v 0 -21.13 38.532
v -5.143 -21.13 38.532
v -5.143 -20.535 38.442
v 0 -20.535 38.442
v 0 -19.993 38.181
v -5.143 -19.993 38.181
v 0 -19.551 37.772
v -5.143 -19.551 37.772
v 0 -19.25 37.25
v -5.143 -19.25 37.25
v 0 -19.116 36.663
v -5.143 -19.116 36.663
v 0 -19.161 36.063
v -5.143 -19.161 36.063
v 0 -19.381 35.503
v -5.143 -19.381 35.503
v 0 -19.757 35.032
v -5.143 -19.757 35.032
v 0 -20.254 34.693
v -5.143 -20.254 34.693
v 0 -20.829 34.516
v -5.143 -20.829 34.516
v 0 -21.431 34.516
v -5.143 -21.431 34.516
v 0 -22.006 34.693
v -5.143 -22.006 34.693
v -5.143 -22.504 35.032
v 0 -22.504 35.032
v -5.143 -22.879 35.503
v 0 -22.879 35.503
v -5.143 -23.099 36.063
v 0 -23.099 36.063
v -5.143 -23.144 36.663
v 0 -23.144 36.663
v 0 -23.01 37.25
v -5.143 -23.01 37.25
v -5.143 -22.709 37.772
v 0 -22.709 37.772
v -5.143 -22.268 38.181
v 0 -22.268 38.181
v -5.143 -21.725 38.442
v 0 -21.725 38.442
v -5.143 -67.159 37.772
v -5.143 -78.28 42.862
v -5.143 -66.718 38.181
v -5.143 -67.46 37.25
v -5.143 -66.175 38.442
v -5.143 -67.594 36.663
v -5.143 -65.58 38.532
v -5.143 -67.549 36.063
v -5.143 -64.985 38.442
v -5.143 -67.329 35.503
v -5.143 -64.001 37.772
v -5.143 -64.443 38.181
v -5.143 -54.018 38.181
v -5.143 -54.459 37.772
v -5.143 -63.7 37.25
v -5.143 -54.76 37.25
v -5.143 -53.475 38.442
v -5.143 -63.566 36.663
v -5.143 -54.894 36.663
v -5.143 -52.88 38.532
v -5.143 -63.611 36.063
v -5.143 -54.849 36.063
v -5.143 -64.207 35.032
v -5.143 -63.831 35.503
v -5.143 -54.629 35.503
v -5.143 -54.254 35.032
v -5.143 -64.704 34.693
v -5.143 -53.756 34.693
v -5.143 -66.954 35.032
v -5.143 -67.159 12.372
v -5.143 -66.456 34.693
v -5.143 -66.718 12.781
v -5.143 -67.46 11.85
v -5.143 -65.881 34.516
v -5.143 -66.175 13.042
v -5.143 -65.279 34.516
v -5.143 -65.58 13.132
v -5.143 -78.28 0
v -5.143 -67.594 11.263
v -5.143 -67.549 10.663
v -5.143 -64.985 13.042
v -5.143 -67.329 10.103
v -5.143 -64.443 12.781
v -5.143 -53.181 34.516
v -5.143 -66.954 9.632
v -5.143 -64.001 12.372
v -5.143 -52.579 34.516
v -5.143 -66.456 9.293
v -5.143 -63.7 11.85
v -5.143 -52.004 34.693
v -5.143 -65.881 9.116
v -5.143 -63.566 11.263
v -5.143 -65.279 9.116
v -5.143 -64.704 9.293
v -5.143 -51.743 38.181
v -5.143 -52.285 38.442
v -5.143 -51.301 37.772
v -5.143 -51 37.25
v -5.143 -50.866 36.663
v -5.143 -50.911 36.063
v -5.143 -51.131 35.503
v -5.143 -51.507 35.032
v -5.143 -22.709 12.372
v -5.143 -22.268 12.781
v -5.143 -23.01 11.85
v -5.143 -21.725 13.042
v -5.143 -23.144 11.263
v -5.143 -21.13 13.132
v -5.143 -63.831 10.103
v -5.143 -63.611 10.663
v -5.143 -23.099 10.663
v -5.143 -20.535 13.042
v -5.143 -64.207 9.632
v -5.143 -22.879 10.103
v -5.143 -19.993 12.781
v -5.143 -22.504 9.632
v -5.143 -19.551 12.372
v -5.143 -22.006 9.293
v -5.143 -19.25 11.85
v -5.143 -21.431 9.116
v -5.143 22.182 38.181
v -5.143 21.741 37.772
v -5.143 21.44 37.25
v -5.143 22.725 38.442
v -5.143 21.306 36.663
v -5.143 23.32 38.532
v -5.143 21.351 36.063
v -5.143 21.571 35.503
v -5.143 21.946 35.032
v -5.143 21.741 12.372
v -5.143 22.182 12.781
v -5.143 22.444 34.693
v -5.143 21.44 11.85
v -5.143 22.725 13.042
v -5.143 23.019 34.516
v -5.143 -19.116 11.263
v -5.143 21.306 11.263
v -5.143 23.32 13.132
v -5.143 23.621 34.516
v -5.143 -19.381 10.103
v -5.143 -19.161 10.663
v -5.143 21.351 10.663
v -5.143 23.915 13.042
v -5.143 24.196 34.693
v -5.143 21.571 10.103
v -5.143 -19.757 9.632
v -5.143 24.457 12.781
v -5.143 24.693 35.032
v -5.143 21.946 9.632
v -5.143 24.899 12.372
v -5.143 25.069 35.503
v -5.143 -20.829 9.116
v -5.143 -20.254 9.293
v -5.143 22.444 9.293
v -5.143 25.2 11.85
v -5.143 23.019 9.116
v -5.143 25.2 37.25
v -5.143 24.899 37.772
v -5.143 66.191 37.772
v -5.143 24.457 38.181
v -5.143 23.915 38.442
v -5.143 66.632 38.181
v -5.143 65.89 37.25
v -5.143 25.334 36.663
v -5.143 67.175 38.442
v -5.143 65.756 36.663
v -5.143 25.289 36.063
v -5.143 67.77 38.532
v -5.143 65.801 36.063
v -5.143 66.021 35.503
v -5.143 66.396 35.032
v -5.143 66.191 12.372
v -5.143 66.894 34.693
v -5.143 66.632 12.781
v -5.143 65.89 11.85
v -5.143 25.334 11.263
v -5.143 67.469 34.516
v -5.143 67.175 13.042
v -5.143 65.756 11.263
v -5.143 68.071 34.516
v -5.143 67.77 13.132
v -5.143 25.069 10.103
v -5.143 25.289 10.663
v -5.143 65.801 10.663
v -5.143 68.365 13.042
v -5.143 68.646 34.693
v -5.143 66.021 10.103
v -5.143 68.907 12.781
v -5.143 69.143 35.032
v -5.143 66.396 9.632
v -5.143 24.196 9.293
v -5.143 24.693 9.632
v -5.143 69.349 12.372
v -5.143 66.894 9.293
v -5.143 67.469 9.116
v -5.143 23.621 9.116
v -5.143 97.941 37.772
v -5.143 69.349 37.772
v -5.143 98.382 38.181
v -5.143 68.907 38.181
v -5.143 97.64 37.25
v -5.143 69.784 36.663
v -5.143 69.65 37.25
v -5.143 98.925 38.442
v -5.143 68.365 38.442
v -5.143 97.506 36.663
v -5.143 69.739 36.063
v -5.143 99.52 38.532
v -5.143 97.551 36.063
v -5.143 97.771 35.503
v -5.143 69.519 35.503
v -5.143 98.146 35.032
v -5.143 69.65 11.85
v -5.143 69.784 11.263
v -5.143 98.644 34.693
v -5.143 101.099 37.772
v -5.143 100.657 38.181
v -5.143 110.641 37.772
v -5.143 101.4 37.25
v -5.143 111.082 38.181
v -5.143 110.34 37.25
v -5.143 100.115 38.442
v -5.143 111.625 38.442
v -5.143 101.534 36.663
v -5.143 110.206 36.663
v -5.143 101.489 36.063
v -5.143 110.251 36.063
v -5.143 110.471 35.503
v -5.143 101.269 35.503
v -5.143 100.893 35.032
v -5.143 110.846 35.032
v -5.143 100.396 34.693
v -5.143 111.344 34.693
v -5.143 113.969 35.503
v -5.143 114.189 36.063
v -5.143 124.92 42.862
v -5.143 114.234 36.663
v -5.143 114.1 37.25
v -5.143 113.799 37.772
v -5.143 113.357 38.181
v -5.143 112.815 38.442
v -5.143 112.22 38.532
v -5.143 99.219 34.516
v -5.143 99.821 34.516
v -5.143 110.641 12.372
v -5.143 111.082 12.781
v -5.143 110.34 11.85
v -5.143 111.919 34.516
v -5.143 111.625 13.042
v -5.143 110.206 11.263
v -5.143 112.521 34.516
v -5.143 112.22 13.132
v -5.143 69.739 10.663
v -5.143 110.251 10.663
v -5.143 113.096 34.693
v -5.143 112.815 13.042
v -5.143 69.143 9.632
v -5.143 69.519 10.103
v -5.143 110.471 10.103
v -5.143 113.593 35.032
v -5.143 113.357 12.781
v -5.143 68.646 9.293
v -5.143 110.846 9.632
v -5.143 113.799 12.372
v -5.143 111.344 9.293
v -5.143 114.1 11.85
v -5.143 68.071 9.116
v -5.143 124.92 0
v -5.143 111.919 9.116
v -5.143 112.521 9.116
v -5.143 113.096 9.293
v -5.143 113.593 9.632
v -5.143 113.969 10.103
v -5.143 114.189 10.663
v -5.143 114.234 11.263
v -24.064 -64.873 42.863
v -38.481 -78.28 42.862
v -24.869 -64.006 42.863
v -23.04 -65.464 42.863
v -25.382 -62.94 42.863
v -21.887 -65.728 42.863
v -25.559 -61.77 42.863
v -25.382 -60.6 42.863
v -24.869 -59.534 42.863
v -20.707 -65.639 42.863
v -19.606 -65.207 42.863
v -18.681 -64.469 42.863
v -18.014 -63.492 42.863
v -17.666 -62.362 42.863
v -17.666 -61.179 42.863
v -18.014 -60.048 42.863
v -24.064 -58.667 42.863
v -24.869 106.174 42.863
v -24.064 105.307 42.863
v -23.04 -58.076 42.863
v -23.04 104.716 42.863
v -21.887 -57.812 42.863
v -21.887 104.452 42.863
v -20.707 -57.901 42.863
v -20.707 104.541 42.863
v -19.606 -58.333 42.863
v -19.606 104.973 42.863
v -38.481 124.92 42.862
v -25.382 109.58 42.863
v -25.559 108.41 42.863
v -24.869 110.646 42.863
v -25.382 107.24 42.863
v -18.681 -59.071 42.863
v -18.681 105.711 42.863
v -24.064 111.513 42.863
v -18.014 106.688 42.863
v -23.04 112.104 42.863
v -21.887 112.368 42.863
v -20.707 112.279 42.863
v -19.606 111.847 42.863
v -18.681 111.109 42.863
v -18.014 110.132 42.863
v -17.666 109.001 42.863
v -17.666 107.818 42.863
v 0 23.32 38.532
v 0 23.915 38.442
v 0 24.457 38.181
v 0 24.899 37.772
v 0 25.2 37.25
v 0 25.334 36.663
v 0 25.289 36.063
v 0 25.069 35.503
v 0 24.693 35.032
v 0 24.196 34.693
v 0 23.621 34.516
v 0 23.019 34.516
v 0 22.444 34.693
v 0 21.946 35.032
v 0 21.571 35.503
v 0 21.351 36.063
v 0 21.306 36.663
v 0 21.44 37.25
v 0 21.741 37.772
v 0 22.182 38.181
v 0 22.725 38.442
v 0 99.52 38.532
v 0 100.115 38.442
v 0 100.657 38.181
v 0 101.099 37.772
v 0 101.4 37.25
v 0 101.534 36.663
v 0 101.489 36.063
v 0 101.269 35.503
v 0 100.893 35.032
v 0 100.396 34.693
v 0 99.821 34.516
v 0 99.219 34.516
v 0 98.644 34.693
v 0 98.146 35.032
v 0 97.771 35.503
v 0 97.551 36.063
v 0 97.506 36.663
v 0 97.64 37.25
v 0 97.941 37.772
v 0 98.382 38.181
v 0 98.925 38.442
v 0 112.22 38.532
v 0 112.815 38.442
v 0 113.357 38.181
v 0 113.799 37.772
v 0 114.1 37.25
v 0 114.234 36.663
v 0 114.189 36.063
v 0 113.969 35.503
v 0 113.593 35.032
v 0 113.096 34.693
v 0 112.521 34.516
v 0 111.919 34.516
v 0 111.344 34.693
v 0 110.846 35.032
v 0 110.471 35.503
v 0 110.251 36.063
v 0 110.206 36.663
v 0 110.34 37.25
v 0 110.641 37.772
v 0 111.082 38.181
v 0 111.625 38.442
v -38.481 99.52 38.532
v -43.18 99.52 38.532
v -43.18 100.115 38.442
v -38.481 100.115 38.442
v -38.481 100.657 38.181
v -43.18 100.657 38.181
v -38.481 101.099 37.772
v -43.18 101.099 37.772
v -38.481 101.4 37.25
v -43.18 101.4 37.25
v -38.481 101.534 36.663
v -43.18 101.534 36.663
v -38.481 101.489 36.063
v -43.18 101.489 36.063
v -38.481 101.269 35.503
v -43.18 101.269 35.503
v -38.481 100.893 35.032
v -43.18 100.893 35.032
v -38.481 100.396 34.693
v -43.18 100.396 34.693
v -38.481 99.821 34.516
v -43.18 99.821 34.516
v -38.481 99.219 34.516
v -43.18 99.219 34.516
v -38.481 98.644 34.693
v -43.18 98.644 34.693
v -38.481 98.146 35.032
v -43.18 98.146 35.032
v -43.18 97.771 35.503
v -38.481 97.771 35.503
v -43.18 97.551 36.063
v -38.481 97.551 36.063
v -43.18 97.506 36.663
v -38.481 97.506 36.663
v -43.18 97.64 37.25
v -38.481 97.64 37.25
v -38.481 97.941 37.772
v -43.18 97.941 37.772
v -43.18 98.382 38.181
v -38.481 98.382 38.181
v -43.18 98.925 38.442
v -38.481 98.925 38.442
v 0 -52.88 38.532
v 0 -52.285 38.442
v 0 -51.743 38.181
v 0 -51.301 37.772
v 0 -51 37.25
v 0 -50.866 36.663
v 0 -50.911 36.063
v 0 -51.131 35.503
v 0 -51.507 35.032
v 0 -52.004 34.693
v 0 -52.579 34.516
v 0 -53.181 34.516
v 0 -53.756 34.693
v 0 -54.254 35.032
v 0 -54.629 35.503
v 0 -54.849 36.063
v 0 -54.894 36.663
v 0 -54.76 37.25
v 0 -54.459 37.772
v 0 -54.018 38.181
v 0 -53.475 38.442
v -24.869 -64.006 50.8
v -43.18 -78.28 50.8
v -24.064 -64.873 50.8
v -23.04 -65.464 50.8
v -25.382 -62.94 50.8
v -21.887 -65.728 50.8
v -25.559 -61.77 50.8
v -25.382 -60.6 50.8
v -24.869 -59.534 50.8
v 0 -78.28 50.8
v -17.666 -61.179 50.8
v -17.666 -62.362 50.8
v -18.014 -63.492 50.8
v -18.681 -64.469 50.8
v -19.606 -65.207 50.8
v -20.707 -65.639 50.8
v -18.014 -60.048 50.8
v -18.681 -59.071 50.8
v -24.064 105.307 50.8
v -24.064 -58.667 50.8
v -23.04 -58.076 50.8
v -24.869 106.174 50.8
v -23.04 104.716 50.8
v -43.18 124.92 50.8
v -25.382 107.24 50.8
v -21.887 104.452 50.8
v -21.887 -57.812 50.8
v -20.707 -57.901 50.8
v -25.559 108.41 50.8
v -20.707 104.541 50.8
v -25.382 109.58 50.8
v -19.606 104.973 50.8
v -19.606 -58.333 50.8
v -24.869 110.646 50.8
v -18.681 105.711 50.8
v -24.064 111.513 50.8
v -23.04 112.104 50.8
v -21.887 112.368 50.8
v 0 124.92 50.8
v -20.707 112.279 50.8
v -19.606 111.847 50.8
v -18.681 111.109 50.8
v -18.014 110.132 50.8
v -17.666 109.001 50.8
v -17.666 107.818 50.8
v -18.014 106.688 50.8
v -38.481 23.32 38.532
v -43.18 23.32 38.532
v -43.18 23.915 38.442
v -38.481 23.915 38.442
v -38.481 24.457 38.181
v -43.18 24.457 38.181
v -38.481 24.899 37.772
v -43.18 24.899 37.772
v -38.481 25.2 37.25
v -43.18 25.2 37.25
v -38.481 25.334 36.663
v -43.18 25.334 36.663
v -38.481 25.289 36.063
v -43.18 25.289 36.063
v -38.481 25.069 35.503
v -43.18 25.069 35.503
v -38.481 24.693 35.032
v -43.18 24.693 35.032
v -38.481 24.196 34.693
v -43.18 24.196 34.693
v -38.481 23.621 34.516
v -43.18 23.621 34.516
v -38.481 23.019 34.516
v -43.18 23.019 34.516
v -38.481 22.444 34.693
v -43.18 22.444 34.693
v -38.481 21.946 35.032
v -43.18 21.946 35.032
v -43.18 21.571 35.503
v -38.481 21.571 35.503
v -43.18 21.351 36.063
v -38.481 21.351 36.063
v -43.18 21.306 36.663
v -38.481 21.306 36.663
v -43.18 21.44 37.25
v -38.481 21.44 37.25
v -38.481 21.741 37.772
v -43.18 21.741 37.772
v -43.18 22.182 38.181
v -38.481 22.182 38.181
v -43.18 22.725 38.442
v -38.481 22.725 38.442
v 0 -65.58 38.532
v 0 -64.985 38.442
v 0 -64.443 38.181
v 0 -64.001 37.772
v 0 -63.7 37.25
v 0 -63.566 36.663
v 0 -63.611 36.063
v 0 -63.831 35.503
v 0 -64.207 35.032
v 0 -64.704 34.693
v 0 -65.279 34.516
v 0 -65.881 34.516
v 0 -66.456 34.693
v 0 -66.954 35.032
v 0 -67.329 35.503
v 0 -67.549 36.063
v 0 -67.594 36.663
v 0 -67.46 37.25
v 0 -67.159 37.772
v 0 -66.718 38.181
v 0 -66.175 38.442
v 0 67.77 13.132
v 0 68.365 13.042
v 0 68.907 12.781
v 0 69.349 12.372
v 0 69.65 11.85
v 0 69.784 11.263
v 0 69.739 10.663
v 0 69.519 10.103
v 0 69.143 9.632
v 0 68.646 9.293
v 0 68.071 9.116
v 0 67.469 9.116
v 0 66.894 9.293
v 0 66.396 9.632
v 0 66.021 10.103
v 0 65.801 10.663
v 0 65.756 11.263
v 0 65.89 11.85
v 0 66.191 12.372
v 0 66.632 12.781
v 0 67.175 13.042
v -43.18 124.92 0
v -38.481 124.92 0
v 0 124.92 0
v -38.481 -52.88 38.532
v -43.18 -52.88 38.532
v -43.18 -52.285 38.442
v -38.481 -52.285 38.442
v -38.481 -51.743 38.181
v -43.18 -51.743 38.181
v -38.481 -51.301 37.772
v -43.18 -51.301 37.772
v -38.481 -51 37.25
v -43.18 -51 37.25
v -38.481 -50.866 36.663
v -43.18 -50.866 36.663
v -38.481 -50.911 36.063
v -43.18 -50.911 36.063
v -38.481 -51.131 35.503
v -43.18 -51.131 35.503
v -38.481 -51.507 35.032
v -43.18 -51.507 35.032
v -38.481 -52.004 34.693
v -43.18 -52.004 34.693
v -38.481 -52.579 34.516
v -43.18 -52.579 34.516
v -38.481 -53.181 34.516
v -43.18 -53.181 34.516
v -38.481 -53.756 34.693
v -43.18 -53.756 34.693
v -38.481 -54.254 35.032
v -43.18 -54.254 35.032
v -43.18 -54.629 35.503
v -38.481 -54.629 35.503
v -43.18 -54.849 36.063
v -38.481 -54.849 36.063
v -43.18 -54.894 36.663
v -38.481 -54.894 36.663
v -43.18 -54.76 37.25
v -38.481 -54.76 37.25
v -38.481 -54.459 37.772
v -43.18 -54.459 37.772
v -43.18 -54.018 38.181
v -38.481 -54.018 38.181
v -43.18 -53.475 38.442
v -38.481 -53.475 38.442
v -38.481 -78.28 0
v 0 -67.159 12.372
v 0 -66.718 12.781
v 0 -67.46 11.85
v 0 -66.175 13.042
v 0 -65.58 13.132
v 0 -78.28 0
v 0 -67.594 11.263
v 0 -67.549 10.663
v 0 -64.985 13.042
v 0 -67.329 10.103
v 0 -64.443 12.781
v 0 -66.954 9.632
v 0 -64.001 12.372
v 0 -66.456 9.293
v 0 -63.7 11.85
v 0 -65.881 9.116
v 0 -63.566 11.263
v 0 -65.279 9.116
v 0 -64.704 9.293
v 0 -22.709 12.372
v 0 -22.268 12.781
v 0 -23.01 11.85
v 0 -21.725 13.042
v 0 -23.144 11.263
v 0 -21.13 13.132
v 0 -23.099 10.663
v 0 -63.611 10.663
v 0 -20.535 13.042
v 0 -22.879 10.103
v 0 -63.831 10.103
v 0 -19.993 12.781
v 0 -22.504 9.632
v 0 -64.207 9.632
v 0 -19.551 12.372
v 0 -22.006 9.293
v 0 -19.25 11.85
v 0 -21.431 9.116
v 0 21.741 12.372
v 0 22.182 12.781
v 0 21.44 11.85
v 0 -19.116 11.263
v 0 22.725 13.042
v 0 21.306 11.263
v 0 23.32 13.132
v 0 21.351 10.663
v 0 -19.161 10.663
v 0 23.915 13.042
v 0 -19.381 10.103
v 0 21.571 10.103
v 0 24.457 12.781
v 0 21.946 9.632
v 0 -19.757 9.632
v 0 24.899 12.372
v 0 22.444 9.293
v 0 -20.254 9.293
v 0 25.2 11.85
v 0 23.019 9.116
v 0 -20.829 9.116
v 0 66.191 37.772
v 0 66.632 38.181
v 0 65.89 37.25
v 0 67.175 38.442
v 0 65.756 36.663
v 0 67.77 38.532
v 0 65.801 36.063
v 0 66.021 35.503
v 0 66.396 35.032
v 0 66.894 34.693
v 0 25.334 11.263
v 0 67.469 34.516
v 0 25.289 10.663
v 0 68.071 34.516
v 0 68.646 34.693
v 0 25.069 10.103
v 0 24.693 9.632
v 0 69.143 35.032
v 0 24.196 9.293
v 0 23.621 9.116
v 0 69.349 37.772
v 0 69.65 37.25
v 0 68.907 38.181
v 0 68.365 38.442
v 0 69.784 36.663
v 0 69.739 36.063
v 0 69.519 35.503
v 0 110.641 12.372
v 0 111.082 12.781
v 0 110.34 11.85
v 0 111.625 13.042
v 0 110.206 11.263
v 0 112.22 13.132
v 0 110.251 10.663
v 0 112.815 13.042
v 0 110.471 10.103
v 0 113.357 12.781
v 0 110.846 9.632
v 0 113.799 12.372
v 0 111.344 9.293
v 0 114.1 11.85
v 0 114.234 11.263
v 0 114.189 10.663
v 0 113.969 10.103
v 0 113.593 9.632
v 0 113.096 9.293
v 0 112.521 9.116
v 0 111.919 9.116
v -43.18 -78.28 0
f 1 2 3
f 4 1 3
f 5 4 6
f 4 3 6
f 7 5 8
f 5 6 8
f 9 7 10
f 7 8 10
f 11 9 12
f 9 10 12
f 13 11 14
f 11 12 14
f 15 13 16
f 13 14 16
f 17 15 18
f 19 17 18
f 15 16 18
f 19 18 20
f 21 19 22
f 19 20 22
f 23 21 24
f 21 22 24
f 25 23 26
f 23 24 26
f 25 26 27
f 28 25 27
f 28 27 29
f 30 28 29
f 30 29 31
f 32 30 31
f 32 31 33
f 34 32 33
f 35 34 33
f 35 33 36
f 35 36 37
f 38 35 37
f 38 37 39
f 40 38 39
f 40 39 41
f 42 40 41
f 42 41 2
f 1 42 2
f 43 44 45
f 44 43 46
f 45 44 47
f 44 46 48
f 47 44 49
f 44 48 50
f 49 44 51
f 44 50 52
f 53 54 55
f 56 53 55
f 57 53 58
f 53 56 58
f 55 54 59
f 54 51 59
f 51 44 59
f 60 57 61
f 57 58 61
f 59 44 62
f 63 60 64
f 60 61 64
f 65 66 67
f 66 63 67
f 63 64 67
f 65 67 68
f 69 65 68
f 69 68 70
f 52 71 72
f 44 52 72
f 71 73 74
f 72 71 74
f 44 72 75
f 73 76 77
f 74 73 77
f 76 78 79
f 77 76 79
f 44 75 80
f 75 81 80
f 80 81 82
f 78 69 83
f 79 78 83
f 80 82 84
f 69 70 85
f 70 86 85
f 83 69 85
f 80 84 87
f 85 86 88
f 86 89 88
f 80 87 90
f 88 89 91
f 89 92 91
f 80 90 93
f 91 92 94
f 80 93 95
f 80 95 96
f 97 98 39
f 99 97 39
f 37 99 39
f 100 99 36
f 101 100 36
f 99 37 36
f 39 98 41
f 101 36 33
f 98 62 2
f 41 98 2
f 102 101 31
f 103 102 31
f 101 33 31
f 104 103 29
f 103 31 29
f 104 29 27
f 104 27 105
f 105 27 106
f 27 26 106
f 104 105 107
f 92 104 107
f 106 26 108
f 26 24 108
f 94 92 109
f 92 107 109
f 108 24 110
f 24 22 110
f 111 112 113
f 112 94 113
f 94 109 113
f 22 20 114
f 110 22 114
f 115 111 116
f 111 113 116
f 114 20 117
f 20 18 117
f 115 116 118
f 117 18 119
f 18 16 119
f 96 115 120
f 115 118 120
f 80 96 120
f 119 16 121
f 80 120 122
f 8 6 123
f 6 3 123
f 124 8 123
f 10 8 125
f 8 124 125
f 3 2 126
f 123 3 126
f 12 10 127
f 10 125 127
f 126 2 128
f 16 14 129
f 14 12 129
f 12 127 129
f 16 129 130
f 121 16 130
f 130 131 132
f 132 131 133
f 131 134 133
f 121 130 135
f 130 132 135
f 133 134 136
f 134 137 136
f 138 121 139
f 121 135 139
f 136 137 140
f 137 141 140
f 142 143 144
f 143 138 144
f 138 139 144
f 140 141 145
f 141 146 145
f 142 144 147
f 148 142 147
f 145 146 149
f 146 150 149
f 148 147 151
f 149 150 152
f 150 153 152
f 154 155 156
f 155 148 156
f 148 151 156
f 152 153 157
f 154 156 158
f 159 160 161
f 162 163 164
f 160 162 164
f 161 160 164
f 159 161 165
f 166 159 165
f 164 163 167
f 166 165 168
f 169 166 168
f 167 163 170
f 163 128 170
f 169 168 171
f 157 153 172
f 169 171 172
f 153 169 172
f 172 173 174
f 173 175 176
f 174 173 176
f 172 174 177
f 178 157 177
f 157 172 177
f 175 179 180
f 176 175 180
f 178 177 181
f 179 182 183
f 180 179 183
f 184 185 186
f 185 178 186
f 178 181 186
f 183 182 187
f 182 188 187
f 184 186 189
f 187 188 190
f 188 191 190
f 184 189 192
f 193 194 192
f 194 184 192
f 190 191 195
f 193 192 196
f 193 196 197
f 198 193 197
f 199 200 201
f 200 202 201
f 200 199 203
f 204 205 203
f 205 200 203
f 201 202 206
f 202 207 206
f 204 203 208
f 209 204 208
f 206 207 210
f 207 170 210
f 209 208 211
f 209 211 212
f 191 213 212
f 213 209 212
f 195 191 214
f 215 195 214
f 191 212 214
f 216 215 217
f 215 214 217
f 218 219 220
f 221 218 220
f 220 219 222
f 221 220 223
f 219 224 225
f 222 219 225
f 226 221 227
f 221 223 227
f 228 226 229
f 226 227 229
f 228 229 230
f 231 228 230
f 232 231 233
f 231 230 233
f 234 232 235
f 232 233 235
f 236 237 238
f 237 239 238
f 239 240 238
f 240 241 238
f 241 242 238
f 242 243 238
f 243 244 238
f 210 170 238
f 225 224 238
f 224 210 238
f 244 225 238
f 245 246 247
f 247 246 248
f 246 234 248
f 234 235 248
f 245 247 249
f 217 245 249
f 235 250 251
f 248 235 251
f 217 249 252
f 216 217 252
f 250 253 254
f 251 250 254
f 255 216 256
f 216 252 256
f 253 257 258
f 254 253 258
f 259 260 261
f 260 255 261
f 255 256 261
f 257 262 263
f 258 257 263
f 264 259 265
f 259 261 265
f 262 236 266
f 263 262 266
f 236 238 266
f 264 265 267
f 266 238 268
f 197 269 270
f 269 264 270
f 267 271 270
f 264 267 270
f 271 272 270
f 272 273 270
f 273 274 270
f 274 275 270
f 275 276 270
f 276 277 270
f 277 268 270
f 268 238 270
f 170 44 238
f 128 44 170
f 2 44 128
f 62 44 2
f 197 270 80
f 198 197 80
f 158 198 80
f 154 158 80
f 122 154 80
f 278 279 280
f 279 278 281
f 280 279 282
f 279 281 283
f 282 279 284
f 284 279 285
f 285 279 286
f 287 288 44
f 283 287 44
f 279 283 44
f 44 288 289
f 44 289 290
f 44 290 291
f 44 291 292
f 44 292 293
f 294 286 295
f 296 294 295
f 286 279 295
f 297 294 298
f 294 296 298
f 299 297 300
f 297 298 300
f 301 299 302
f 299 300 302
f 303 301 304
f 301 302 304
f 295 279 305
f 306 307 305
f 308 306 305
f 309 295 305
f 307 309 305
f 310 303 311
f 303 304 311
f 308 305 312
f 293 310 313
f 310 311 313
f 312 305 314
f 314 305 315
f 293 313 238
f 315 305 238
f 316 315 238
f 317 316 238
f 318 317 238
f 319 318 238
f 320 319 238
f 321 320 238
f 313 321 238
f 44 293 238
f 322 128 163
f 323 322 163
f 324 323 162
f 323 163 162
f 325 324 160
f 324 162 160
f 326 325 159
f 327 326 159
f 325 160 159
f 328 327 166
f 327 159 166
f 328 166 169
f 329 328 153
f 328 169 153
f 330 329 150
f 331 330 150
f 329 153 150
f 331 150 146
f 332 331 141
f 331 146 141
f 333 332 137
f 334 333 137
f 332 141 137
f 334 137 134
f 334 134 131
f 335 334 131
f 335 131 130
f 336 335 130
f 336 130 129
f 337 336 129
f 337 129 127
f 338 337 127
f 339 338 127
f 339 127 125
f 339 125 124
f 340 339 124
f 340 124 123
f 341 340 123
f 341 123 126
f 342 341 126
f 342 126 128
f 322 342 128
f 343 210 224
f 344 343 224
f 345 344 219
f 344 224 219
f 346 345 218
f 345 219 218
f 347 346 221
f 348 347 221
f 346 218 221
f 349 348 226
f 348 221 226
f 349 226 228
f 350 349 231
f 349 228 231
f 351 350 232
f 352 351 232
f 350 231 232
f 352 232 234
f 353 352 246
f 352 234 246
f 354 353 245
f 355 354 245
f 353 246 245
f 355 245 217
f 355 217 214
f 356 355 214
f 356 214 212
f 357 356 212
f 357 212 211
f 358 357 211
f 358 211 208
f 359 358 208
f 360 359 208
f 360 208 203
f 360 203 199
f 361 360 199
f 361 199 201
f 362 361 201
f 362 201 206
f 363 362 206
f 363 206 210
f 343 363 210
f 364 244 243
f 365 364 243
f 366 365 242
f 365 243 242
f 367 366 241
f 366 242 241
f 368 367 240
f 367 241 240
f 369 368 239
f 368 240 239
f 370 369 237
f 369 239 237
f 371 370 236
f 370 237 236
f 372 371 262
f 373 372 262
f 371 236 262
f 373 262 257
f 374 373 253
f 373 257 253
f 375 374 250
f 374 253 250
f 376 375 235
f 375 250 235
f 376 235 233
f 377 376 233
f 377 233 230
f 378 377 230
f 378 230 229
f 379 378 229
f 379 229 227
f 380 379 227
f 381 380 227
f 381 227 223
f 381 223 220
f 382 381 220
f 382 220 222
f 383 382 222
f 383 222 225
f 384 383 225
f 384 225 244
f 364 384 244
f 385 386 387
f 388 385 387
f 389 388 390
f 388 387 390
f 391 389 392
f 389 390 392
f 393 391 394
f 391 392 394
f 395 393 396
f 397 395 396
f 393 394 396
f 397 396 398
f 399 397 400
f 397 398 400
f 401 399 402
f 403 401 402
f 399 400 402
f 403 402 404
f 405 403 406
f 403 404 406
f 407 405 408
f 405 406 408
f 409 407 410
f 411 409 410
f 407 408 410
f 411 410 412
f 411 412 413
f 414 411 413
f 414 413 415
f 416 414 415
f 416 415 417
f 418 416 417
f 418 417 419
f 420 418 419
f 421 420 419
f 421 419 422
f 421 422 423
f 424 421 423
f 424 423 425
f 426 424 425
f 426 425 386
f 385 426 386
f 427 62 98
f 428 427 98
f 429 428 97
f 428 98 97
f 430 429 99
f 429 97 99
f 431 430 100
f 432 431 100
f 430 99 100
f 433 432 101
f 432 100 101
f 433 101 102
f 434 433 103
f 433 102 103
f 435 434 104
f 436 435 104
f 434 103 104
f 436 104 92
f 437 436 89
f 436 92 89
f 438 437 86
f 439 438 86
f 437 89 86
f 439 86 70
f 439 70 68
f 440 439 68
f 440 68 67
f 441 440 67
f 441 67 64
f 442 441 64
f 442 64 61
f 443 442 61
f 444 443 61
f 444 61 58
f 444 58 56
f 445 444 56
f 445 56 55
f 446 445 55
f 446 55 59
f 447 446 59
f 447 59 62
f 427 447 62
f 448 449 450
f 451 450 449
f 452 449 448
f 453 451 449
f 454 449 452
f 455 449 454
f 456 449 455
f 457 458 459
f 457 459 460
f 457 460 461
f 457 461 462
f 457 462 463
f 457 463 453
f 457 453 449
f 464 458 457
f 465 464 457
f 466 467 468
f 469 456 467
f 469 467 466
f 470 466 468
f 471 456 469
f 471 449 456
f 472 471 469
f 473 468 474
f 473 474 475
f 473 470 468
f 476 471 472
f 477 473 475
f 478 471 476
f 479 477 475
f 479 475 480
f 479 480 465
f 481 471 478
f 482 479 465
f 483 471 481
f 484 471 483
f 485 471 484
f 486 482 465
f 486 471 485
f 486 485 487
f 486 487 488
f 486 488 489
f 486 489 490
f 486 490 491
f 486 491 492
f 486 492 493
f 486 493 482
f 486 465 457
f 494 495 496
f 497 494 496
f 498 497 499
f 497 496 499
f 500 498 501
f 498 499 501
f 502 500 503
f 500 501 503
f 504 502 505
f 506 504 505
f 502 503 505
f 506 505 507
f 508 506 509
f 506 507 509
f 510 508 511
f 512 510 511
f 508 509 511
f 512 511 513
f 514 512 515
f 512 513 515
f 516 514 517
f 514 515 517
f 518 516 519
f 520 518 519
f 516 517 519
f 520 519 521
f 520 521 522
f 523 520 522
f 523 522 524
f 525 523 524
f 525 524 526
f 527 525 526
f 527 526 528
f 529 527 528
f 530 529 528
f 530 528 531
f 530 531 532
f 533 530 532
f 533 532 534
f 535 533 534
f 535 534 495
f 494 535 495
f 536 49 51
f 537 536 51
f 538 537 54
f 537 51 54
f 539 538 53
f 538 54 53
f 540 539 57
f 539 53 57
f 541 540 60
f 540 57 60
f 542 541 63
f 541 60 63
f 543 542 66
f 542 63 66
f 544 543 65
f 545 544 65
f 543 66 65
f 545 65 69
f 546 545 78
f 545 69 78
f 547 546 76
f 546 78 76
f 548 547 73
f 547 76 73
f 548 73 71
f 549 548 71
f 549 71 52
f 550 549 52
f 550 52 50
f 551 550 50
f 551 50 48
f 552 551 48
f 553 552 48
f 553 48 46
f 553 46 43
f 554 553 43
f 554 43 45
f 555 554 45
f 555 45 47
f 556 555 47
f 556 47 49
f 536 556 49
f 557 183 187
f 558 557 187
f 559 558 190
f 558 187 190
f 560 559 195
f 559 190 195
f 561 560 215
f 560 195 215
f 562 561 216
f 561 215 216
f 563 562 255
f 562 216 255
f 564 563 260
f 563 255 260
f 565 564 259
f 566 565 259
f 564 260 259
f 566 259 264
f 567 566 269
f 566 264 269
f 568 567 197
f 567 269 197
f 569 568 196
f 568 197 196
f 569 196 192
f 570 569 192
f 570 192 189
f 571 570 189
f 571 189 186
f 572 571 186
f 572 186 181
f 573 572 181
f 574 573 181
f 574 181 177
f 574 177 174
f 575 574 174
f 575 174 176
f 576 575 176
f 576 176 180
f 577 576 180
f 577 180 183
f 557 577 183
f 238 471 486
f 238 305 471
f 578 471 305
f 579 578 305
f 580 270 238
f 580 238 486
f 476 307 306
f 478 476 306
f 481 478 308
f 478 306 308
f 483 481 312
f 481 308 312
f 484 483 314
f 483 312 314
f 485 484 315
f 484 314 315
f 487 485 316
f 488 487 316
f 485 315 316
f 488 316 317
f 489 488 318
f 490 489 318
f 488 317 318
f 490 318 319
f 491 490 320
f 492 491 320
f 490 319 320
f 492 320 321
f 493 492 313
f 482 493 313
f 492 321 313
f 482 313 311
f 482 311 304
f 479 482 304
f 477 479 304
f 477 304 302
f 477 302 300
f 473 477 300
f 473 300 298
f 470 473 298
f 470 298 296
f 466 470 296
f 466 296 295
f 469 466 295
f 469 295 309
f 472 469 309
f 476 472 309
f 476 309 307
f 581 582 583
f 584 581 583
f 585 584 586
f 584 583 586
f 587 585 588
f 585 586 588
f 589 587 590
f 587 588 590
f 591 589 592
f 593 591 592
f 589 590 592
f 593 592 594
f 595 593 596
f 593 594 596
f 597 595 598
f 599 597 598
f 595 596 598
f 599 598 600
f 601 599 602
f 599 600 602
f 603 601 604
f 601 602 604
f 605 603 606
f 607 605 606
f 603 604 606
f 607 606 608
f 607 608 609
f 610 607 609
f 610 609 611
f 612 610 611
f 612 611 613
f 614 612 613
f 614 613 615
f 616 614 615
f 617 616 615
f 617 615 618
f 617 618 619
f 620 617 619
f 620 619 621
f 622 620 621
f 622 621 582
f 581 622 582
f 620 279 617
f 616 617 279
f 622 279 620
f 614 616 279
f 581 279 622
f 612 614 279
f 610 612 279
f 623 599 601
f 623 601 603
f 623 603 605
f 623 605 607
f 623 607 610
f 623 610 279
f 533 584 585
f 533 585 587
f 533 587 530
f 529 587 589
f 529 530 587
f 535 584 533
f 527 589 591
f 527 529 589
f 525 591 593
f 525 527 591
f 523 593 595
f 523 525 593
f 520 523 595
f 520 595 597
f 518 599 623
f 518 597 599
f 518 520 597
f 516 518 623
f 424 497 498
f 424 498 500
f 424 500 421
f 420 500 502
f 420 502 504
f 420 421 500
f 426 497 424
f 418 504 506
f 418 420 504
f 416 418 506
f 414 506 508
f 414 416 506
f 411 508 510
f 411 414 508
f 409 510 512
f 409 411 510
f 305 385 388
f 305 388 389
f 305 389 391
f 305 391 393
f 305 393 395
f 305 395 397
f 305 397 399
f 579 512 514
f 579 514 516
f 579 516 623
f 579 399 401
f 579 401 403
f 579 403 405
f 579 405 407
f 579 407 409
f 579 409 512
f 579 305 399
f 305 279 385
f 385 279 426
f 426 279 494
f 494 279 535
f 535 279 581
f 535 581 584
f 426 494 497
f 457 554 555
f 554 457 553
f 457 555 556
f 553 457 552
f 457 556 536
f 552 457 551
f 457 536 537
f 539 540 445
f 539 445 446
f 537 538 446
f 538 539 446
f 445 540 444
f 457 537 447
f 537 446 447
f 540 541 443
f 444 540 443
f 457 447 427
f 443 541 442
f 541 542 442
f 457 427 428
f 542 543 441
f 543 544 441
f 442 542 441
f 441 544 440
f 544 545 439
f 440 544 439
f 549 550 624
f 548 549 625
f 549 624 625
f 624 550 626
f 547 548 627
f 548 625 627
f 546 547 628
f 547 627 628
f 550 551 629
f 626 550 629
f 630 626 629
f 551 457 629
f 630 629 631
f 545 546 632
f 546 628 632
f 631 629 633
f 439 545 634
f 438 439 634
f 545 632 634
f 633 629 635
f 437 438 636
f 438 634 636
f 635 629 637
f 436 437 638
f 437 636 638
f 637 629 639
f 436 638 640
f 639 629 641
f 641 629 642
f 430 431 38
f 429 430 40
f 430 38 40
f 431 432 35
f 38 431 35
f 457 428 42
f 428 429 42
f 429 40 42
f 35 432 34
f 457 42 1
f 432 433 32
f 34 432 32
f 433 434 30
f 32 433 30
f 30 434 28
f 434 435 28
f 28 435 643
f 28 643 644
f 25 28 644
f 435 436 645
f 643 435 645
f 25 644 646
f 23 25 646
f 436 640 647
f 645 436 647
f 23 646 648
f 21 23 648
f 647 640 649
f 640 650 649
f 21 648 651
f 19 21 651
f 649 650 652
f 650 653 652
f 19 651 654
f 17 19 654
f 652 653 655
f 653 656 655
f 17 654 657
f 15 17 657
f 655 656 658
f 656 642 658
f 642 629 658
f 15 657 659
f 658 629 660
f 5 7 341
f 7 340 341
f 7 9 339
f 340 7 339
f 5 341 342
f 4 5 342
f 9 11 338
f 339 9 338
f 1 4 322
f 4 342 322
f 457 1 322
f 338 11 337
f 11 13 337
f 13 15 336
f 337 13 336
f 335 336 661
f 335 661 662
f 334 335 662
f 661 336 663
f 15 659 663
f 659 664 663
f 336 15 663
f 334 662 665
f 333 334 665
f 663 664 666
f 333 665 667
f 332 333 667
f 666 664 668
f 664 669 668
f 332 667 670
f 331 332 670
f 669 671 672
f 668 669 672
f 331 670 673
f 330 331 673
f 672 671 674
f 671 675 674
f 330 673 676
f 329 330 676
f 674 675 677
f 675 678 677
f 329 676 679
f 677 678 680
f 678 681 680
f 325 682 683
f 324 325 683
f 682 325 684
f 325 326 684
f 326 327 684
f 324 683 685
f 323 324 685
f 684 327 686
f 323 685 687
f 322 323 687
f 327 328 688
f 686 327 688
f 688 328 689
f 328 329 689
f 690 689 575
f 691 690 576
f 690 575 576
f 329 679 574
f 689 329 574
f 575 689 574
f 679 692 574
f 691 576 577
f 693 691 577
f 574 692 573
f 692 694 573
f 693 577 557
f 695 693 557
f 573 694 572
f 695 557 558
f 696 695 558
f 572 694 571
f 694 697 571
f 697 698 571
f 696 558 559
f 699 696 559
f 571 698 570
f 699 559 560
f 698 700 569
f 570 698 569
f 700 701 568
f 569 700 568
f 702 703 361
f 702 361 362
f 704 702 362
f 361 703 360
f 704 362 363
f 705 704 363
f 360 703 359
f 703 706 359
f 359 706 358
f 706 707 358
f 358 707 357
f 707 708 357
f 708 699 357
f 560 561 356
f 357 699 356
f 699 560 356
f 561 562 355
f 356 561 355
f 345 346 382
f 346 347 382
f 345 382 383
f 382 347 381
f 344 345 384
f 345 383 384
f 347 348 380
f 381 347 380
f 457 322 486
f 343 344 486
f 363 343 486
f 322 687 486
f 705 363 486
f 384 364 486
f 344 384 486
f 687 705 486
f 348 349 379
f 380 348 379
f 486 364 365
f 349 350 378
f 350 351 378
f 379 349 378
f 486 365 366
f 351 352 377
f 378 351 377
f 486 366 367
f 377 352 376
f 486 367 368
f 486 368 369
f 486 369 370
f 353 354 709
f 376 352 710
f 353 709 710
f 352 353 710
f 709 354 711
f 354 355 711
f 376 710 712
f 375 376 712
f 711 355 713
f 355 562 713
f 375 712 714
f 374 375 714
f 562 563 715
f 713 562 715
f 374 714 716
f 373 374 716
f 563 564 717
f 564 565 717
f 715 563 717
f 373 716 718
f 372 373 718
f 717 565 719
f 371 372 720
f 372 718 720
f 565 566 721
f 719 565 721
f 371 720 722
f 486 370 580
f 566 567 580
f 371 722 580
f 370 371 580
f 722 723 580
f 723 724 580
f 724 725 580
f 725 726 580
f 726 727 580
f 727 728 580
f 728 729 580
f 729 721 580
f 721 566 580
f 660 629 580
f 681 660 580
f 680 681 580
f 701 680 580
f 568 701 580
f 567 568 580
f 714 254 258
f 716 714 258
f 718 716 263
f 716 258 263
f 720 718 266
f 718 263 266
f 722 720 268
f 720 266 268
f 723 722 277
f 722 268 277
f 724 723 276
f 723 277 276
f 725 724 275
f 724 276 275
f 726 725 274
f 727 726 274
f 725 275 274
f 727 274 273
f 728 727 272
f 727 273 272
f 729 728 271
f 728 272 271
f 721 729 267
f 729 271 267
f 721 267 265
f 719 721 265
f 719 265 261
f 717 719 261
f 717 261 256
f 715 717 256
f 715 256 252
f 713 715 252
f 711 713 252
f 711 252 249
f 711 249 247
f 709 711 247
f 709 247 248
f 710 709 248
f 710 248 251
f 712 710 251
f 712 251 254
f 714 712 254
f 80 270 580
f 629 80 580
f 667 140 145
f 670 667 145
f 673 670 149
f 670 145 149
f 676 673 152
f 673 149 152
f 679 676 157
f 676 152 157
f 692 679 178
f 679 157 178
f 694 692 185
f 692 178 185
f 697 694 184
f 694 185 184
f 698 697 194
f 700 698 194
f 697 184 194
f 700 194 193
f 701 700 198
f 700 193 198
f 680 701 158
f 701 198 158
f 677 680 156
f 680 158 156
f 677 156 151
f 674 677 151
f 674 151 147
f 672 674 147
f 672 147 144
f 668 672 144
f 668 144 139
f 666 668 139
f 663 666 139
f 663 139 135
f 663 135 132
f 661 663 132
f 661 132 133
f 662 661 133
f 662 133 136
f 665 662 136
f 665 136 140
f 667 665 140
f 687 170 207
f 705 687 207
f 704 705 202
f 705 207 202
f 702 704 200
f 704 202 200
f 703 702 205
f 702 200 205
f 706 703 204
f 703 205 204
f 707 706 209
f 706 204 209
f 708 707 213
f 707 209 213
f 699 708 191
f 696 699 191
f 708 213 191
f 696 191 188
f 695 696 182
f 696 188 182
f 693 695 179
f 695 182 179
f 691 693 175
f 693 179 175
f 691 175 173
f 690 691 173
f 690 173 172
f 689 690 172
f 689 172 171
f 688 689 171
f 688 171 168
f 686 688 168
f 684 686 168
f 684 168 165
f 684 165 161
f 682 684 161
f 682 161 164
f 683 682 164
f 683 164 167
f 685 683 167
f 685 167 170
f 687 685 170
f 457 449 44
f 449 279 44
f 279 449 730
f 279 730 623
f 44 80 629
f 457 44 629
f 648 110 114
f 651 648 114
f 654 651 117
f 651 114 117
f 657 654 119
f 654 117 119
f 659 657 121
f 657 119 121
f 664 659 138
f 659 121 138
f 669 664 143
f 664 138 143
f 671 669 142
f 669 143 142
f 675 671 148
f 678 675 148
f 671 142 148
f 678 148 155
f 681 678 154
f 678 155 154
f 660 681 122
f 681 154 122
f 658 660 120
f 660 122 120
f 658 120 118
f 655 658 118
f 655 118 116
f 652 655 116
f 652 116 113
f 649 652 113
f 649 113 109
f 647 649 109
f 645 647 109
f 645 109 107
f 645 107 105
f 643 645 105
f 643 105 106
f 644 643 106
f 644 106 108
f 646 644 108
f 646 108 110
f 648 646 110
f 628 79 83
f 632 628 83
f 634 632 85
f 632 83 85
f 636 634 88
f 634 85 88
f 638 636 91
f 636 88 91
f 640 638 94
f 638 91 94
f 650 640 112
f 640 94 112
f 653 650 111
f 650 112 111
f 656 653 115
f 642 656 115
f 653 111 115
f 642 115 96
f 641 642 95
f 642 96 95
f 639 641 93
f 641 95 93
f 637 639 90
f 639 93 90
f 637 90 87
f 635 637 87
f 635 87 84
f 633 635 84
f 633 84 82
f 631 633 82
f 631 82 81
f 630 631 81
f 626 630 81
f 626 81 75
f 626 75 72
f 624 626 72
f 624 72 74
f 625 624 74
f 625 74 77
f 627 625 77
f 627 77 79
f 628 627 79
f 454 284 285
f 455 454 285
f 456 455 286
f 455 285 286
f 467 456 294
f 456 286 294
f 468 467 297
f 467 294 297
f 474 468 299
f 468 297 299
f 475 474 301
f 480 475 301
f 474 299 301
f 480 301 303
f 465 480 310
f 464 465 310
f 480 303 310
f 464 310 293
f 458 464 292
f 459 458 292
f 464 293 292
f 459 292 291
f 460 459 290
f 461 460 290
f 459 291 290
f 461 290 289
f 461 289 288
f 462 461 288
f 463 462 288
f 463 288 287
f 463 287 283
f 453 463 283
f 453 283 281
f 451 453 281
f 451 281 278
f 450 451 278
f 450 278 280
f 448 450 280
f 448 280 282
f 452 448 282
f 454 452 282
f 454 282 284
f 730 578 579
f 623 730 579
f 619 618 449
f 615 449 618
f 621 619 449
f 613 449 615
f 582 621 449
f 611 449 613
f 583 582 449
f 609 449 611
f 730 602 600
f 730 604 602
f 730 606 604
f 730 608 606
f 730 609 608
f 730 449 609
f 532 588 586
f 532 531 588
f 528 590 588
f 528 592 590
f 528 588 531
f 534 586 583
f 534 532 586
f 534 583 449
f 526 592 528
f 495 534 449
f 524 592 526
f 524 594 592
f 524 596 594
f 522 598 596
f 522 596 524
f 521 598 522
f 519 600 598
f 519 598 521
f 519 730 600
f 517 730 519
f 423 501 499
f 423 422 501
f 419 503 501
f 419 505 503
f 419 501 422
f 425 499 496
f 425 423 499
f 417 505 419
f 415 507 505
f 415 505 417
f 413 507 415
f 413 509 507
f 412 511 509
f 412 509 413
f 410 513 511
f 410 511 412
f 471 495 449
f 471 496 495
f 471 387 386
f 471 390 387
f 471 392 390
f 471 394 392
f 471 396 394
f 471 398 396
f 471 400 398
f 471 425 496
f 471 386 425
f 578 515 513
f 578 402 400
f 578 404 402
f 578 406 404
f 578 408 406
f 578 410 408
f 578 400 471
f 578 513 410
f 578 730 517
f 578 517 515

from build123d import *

# Parameters (mm, degrees)
SKETCH1_W                  = 43.18
SKETCH1_H                  = 203.2
BOSS_EXTRUDE1_DEPTH        = 50.8
F_3_8_16_TAPPED_HOLE1_D    = 7.9375
F_10_32_TAPPED_HOLE1_D     = 4.0386
SKETCH9_W                  = 33.3375
SKETCH9_H                  = 50.596782444
CUT_EXTRUDE1_DEPTH         = 214.858346575
F_10_32_TAPPED_HOLE2_D     = 4.0386
F_10_32_TAPPED_HOLE2_DEPTH = 17.78
F_10_32_TAPPED_HOLE2_TIP   = 1.213317848
F_10_32_TAPPED_HOLE3_D     = 4.0386
F_10_32_TAPPED_HOLE3_DEPTH = 17.78
F_10_32_TAPPED_HOLE3_TIP   = 1.213317848


with BuildPart() as part:
    # Sketch1 → Boss-Extrude1 (new body)
    with BuildSketch(Plane.XY):
        with Locations((-21.59, 23.319966314)):
            Rectangle(SKETCH1_W, SKETCH1_H)
    extrude(amount=BOSS_EXTRUDE1_DEPTH)

    # 3/8-16 Tapped Hole1 (through all)
    with Locations(Plane.XY.offset(50.8)):
        with Locations((-21.59, 108.409966314), (-21.59, -61.770033686)):
            Hole(F_3_8_16_TAPPED_HOLE1_D / 2)

    # #10-32 Tapped Hole1 (through all)
    with Locations(Plane(origin=(0, 0, 0), x_dir=(0, 0, -1), z_dir=(1, 0, 0))):
        with Locations((-36.5125, 99.519966314), (-36.5125, 23.319966314), (-36.5125, -52.880033686)):
            Hole(F_10_32_TAPPED_HOLE1_D / 2)

    # Sketch9 → Cut-Extrude1 (cut, through all)
    with BuildSketch(Plane(origin=(0, 124.919966314, 0), x_dir=(1, 0, 0), z_dir=(0, 1, 0))):
        with Locations((-21.81225, -17.564108778)):
            Rectangle(SKETCH9_W, SKETCH9_H)
    extrude(amount=-CUT_EXTRUDE1_DEPTH, mode=Mode.SUBTRACT)

    # #10-32 Tapped Hole2
    with Locations(Plane(origin=(3.175, 53.792091732, -9.087092082), x_dir=(0, 0, -1), z_dir=(1, 0, 0))):
        with Locations((284.600407918, 58.427874582), (310.000407918, 58.427874582), (284.600407918, 13.977874582), (310.000407918, 13.977874582), (284.600407918, -30.472125418), (284.600407918, -74.922125418), (310.000407918, -74.922125418), (284.600407918, -119.372125418), (310.000407918, -119.372125418), (-20.199592082, 58.427874582), (-45.599592082, 58.427874582), (-20.199592082, 13.977874582), (-45.599592082, 13.977874582), (-20.199592082, -30.472125418), (-20.199592082, -74.922125418), (-45.599592082, -74.922125418), (-45.599592082, -119.372125418), (-20.199592082, -119.372125418)):
            Hole(F_10_32_TAPPED_HOLE2_D / 2, depth=F_10_32_TAPPED_HOLE2_DEPTH)
            with Locations((0, 0, -(F_10_32_TAPPED_HOLE2_DEPTH + F_10_32_TAPPED_HOLE2_TIP / 2))):  # 118° drill point
                Cone(0, F_10_32_TAPPED_HOLE2_D / 2, F_10_32_TAPPED_HOLE2_TIP, mode=Mode.SUBTRACT)

    # #10-32 Tapped Hole3
    with Locations(Plane(origin=(3.175, -7.152159104, -273.487907918), x_dir=(0, 0, 1), z_dir=(1, 0, 0))):
        with Locations((284.600407918, 58.427874582), (310.000407918, 58.427874582), (284.600407918, 13.977874582), (310.000407918, 13.977874582), (284.600407918, -30.472125418), (284.600407918, -74.922125418), (310.000407918, -74.922125418), (284.600407918, -119.372125418), (310.000407918, -119.372125418), (-20.199592082, 58.427874582), (-45.599592082, 58.427874582), (-20.199592082, 13.977874582), (-45.599592082, 13.977874582), (-20.199592082, -30.472125418), (-20.199592082, -74.922125418), (-45.599592082, -74.922125418), (-45.599592082, -119.372125418), (-20.199592082, -119.372125418)):
            Hole(F_10_32_TAPPED_HOLE3_D / 2, depth=F_10_32_TAPPED_HOLE3_DEPTH)
            with Locations((0, 0, -(F_10_32_TAPPED_HOLE3_DEPTH + F_10_32_TAPPED_HOLE3_TIP / 2))):  # 118° drill point
                Cone(0, F_10_32_TAPPED_HOLE3_D / 2, F_10_32_TAPPED_HOLE3_TIP, mode=Mode.SUBTRACT)


solid = part.part
